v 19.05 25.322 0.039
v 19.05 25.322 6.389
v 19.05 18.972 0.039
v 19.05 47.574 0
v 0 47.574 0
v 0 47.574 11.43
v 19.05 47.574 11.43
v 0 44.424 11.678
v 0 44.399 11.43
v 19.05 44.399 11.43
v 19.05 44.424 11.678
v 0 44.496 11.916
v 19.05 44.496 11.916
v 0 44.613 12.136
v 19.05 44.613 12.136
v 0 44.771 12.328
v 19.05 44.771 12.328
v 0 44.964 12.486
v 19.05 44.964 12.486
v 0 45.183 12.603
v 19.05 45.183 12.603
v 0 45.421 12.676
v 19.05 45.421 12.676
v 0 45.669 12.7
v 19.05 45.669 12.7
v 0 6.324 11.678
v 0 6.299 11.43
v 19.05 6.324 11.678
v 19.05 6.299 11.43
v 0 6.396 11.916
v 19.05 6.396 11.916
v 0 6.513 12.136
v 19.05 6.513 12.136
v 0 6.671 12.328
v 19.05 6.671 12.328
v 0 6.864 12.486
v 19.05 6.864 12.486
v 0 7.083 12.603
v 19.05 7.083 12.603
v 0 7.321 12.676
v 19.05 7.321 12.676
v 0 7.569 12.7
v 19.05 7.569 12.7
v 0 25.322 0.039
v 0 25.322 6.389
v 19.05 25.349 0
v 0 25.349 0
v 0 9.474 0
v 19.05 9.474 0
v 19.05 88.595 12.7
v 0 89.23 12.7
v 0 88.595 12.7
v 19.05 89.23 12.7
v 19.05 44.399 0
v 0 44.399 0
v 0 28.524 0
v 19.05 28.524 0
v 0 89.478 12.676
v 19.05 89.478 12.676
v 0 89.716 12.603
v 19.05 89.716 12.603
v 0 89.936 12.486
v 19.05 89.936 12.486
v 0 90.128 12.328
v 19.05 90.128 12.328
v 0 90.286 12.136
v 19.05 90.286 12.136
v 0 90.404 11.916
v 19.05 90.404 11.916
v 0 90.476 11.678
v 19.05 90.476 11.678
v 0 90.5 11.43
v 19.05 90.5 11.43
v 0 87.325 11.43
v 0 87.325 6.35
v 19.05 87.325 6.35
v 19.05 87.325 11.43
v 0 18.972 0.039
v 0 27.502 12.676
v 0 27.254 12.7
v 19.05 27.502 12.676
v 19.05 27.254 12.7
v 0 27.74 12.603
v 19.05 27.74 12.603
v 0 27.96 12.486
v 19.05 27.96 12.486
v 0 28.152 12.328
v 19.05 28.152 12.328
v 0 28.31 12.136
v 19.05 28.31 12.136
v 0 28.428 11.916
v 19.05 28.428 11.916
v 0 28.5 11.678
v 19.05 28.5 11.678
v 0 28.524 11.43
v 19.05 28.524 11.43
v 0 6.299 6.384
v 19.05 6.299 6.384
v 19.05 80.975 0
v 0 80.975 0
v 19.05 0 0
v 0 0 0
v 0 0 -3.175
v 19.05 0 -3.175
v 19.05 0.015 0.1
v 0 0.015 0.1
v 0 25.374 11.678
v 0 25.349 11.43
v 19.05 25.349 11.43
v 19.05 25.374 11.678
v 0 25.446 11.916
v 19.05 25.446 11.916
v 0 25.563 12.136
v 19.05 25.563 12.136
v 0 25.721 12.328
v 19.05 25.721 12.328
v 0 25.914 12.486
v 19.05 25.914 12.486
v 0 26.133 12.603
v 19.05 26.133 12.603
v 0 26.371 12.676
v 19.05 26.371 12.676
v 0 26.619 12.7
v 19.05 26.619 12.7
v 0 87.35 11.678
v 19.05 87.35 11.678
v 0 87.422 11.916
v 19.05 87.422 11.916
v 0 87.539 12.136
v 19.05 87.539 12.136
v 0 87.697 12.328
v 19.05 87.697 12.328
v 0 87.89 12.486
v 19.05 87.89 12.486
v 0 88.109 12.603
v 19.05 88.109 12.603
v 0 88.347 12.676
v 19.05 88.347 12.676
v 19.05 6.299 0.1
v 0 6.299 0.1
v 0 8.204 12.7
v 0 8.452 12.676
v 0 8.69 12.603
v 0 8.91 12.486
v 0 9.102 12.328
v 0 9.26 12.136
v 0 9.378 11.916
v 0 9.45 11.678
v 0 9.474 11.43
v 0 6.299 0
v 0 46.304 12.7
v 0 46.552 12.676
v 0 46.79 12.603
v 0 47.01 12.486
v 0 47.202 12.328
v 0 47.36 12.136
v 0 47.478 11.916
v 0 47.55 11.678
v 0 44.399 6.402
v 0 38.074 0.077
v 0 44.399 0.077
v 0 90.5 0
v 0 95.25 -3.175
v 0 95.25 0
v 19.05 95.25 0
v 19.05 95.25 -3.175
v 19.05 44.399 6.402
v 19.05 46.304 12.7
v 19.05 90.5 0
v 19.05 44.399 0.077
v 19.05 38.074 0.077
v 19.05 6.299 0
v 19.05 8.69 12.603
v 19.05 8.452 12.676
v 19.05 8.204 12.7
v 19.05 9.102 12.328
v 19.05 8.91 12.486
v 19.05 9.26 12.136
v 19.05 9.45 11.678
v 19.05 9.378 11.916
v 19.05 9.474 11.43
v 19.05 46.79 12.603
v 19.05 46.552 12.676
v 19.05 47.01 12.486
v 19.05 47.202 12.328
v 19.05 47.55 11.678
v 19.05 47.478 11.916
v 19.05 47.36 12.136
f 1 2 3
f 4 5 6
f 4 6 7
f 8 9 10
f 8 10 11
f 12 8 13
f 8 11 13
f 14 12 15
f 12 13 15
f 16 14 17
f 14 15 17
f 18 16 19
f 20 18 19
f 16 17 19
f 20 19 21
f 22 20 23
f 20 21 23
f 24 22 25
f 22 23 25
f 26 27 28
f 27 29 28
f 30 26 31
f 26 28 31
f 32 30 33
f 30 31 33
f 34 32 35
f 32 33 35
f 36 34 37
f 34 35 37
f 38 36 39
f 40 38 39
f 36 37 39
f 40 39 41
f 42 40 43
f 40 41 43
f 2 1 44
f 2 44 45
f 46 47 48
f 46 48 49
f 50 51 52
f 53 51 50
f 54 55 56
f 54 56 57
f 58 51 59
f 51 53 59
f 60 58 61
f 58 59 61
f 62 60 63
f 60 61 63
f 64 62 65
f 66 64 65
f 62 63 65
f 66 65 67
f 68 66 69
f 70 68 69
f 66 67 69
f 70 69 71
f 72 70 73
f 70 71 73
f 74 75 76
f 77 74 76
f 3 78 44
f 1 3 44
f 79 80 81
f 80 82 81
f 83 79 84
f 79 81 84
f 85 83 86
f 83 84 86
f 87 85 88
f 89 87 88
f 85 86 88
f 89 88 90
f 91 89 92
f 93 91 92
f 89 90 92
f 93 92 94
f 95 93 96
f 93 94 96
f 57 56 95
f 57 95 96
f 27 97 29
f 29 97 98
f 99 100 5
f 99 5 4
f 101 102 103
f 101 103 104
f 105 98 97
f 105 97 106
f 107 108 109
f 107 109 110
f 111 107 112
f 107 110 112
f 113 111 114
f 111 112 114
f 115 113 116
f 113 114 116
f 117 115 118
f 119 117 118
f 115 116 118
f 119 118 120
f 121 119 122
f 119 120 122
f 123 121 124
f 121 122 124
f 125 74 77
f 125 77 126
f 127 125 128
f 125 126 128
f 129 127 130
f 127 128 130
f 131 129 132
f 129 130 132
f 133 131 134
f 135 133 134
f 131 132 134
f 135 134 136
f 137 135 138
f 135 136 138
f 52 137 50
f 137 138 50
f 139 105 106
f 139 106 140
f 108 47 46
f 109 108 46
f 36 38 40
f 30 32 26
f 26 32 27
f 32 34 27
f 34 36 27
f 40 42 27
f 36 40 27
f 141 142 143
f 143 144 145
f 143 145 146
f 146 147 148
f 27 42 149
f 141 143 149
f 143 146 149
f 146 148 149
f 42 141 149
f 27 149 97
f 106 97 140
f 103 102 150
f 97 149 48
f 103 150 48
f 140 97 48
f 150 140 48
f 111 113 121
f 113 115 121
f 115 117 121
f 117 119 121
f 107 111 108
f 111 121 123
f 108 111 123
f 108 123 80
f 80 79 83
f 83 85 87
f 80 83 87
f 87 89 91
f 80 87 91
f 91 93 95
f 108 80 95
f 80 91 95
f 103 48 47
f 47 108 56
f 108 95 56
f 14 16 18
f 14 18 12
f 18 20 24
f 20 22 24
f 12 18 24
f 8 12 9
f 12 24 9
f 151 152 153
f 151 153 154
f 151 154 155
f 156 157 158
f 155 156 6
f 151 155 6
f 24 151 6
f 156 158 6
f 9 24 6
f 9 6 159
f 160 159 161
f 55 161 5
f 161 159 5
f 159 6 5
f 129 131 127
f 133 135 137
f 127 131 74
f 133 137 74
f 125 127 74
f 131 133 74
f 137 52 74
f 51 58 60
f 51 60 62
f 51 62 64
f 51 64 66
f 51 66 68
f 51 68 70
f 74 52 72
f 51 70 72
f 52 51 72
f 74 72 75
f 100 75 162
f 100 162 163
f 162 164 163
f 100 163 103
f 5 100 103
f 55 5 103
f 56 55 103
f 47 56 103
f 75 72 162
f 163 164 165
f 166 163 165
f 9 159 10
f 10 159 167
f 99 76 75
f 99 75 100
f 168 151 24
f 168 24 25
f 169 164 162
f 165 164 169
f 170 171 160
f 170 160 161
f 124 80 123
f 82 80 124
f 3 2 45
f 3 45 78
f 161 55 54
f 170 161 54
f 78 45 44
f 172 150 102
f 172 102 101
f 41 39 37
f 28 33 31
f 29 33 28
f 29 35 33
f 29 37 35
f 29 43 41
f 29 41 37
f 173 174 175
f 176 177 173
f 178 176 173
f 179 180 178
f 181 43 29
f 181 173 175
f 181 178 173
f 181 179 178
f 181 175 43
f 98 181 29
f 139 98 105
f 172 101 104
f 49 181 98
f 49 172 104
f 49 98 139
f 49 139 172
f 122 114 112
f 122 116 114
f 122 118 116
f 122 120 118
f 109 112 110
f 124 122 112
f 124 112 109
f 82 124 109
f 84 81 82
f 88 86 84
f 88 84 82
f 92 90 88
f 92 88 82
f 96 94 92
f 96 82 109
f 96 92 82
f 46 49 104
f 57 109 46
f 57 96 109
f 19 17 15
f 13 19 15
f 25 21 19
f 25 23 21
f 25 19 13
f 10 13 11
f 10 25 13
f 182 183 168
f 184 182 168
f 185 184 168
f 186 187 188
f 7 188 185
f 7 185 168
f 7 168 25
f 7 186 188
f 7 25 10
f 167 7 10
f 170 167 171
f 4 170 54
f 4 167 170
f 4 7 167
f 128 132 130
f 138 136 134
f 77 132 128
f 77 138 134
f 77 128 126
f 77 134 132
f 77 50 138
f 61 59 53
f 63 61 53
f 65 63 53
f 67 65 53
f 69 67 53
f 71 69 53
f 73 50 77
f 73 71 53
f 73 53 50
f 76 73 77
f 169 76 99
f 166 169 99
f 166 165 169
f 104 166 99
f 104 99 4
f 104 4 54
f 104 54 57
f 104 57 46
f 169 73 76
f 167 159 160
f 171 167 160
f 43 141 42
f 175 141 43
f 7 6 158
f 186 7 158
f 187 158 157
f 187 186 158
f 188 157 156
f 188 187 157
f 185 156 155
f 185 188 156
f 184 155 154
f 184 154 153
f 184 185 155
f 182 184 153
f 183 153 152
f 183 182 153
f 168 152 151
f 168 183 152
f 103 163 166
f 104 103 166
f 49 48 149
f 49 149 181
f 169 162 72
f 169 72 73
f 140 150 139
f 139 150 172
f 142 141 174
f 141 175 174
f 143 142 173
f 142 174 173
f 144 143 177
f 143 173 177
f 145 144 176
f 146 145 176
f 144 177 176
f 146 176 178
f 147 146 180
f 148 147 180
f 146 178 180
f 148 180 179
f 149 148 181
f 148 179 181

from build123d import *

# Parameters (mm, degrees)
SKETCH1_W           = 19.05
SKETCH1_H           = 95.25
BOSS_EXTRUDE1_DEPTH = 3.175
SKETCH2_W           = 19.05
SKETCH2_H           = 3.175
BOSS_EXTRUDE2_DEPTH = 12.7
BOSS_EXTRUDE3_DEPTH = 19.05
FILLET1_R           = 1.27


with BuildPart() as part:
    # Sketch1 → Boss-Extrude1 (new body)
    with BuildSketch(Plane.XY):
        with Locations((9.525, 47.625)):
            Rectangle(SKETCH1_W, SKETCH1_H)
    extrude(amount=-BOSS_EXTRUDE1_DEPTH)

    # Sketch2 → Boss-Extrude2 (add)
    with BuildSketch(Plane.XY):
        with Locations((9.525, 7.8867)):
            Rectangle(SKETCH2_W, SKETCH2_H)
        with Locations((9.525, 26.9367)):
            Rectangle(SKETCH2_W, SKETCH2_H)
        with Locations((9.525, 45.9867)):
            Rectangle(SKETCH2_W, SKETCH2_H)
        with Locations((9.525, 88.9127)):
            Rectangle(SKETCH2_W, SKETCH2_H)
    extrude(amount=BOSS_EXTRUDE2_DEPTH)

    # Sketch3 → Boss-Extrude3 (add)
    with BuildSketch(Plane(origin=(19.05, 0, 0), x_dir=(0, 0, -1), z_dir=(1, 0, 0))):
        Polygon((0, 87.3252), (-6.35, 87.3252), (0, 80.9752), align=None)
        Polygon((-0.07667178, 44.3992), (-6.401830324, 44.3992), (-0.07667178, 38.074041456), align=None)
        Polygon((-0.038567772, 18.971792462), (-0.038567772, 25.321792462), (-6.388567772, 25.321792462), align=None)
        Polygon((-6.449684868, 6.365000022), (-0.099684868, 0.015000022), (-0.099684868, 6.365000022), align=None)
    extrude(amount=-BOSS_EXTRUDE3_DEPTH)


with BuildPart() as boss_extrude3_piece_1:
    # of the separate pieces the step leaves, piece 1, a body of its own (boss_extrude3_pieces)
    add(part.part.solids().sort_by_distance((0, 0, 0))[0])

    # Fillet1
    fillet1_edges = [boss_extrude3_piece_1.edges().sort_by_distance(p)[0] for p in [
        (9.525, 6.2992, 12.7),
        (9.525, 9.4742, 12.7),
        (9.525, 25.3492, 12.7),
        (9.525, 28.5242, 12.7),
        (9.525, 44.3992, 12.7),
        (9.525, 47.5742, 12.7),
        (9.525, 87.3252, 12.7),
        (9.525, 90.5002, 12.7),
    ]]
    fillet(fillet1_edges, radius=FILLET1_R)


with BuildPart() as boss_extrude3_piece_2:
    # of the separate pieces the step leaves, piece 2, a body of its own (boss_extrude3_pieces)
    add(part.part.solids().sort_by_distance((19.05, 18.971792462, 0.038567772))[0])


solid = Compound([boss_extrude3_piece_1.part, boss_extrude3_piece_2.part])
